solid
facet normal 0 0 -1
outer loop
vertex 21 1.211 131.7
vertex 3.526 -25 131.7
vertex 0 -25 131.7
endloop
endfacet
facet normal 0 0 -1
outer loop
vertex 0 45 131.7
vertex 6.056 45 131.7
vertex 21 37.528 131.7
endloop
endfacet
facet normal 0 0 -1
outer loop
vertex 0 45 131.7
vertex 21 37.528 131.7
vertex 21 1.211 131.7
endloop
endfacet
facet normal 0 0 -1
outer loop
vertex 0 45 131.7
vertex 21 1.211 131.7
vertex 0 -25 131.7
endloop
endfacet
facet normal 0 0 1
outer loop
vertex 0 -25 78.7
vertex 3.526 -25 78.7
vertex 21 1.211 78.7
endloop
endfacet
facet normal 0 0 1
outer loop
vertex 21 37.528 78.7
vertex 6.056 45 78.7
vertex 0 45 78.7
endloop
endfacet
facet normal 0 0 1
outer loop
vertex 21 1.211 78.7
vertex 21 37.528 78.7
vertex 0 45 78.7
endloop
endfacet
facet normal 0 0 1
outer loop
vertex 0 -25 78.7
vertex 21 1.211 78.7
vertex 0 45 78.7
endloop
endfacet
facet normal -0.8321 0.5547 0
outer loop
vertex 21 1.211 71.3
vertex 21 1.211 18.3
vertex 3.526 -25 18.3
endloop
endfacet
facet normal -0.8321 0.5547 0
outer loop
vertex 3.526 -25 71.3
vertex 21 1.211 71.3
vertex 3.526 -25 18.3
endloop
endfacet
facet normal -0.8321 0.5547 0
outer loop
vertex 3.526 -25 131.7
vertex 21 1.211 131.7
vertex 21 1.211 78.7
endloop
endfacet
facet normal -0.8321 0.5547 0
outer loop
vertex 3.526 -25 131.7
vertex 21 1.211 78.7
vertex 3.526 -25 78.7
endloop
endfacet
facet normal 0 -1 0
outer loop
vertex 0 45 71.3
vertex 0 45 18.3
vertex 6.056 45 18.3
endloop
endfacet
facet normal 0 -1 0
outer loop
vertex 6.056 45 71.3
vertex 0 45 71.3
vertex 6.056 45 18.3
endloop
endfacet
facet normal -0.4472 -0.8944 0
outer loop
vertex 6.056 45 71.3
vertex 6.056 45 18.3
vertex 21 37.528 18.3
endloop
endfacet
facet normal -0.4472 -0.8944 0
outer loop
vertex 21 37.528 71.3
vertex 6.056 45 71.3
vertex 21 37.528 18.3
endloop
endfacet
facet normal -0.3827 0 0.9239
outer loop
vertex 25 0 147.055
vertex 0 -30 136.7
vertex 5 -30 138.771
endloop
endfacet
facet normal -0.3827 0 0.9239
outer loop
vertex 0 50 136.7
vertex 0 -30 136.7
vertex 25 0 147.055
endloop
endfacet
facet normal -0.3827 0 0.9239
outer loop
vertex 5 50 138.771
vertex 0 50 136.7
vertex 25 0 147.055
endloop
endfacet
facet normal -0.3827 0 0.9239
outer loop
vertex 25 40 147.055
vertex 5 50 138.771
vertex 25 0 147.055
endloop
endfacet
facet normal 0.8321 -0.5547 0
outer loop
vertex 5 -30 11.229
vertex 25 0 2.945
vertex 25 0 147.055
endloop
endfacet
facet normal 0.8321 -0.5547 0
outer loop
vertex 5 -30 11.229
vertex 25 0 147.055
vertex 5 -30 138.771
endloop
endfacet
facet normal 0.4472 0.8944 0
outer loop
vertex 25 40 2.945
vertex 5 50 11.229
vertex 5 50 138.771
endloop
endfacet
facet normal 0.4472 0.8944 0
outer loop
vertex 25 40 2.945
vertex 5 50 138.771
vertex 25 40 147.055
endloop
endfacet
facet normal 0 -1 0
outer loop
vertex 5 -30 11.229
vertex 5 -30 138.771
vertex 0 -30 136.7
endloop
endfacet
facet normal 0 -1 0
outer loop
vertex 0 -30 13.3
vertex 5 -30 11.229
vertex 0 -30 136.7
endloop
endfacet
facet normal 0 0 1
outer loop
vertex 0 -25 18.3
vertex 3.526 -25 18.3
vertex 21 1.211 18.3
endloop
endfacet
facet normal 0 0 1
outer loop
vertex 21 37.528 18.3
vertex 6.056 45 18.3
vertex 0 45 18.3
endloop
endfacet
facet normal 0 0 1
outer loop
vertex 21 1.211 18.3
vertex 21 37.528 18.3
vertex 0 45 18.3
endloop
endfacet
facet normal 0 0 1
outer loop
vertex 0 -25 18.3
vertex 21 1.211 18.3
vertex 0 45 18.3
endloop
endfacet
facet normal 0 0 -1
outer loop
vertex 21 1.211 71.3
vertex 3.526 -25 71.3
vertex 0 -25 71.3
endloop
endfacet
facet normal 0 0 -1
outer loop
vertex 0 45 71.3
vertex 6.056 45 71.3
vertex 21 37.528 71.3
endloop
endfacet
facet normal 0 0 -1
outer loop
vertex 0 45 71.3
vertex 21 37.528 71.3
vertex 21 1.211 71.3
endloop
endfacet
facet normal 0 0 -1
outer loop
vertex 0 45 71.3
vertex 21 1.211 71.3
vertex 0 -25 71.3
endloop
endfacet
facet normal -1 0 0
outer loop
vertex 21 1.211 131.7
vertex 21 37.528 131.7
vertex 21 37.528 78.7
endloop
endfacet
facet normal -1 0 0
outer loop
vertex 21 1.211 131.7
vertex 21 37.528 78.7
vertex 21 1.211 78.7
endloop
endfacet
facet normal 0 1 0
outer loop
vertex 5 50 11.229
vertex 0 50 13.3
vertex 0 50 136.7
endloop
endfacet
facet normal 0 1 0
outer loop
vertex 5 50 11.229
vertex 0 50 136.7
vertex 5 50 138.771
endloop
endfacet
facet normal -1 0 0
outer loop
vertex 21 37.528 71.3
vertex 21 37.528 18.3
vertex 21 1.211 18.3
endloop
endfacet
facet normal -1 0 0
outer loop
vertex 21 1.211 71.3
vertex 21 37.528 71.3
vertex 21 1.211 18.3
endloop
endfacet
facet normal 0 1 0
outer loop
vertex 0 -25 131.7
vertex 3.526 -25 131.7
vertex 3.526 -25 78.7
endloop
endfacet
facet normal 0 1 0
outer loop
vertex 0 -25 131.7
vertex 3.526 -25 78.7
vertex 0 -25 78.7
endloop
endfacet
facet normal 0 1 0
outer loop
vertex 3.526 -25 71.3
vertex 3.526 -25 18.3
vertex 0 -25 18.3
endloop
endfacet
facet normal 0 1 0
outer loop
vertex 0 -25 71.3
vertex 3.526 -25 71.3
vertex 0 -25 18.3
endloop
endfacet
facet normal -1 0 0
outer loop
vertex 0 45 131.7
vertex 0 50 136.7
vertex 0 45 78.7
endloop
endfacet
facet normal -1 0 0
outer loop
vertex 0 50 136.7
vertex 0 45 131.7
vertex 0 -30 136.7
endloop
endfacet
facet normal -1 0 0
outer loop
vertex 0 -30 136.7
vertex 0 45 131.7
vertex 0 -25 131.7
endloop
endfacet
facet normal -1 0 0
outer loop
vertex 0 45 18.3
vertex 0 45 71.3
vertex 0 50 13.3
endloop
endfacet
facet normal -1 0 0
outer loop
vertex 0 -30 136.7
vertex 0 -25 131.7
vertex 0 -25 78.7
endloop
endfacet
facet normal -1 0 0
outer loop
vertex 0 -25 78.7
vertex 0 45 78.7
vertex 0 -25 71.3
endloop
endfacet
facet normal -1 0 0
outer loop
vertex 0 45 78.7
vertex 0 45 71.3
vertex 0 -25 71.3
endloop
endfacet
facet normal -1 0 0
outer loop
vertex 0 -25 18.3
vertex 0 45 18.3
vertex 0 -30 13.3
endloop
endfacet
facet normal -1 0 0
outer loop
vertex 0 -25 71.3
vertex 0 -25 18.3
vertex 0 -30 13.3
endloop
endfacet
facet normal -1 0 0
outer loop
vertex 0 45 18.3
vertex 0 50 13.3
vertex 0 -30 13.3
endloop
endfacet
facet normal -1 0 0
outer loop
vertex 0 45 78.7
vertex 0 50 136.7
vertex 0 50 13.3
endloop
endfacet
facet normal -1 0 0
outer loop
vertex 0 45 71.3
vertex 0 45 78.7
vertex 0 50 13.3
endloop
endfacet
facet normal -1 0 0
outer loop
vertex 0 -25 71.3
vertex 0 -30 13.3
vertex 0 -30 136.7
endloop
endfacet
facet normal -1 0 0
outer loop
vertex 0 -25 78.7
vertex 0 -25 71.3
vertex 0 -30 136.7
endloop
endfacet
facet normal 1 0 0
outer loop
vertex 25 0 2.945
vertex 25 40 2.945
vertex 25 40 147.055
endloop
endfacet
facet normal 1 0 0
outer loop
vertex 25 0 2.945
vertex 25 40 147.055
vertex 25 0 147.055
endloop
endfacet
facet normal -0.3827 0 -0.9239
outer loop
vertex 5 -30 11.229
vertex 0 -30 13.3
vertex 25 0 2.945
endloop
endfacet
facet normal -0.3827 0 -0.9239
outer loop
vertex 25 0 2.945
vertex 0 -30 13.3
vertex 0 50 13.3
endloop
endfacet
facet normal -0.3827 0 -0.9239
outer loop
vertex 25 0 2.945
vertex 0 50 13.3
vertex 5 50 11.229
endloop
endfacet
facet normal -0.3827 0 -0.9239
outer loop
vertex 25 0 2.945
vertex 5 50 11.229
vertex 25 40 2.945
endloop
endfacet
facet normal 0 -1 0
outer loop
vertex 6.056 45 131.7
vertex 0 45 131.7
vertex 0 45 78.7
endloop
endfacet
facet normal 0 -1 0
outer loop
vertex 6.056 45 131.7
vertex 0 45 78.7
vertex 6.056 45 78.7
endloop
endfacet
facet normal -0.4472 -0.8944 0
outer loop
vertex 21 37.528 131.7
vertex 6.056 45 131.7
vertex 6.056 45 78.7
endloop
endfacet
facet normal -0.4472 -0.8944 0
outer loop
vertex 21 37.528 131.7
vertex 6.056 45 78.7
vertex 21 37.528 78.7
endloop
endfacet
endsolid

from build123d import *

# Parameters (mm, degrees)
EXTRUDE_1_DEPTH     = 150
CUT_EXTRUDE_1_REACH = 173.828
CUT_EXTRUDE_2_DEPTH = 53
CUT_EXTRUDE_3_DEPTH = 53


with BuildPart() as part:
    # 草图1 → 拉伸1 (new body)
    with BuildSketch(Plane.XY):
        Polygon((0, 40), (0, 50), (5, 50), (25, 40), (25, 0), (5, -30), (0, -30), (0, 0), align=None)
    extrude(amount=EXTRUDE_1_DEPTH)

    # 草图2 → 切除-拉伸1 (cut, up to next)
    with BuildSketch(Plane(origin=(0, 50, 0), x_dir=(-1, 0, 0), z_dir=(0, 1, 0)), mode=Mode.PRIVATE) as cut_extrude_1_sk1:
        Polygon((0, 13.3), (-66.261919137, -14.146585575), (0, -14.146585575), align=None)
    cut_extrude_1_tool1 = extrude(cut_extrude_1_sk1.sketch, amount=-CUT_EXTRUDE_1_REACH, mode=Mode.PRIVATE) & part.part
    # 草图2 → 切除-拉伸1 (cut, up to next)
    with BuildSketch(Plane(origin=(0, 50, 0), x_dir=(-1, 0, 0), z_dir=(0, 1, 0)), mode=Mode.PRIVATE) as cut_extrude_1_sk2:
        Polygon((0, 136.7), (-66.261919137, 164.146585575), (0, 164.146585575), align=None)
    cut_extrude_1_tool2 = extrude(cut_extrude_1_sk2.sketch, amount=-CUT_EXTRUDE_1_REACH, mode=Mode.PRIVATE) & part.part
    add(cut_extrude_1_tool1.solids().sort_by_distance((22.087306, 50, -4.997724))[0], mode=Mode.SUBTRACT)
    add(cut_extrude_1_tool2.solids().sort_by_distance((22.087306, 50, 154.997724))[0], mode=Mode.SUBTRACT)

    # 草图4 → 切除-拉伸2 (cut)
    with BuildSketch(Plane(origin=(0, 0, 18.3), x_dir=(-1, 0, 0), z_dir=(0, 0, -1))):
        Polygon((0, 45), (-6.05572809, 45), (-21, 37.527864045), (-21, 1.211102551), (-3.525931633, -25), (0, -25), align=None)
    extrude(amount=-CUT_EXTRUDE_2_DEPTH, mode=Mode.SUBTRACT)

    # 草图5 → 切除-拉伸3 (cut)
    with BuildSketch(Plane(origin=(0, 0, 131.7), x_dir=(-1, 0, 0), z_dir=(0, 0, -1))):
        Polygon((0, 45), (-6.05572809, 45), (-21, 37.527864045), (-21, 1.211102551), (-3.525931633, -25), (0, -25), align=None)
    extrude(amount=CUT_EXTRUDE_3_DEPTH, mode=Mode.SUBTRACT)


solid = part.part
